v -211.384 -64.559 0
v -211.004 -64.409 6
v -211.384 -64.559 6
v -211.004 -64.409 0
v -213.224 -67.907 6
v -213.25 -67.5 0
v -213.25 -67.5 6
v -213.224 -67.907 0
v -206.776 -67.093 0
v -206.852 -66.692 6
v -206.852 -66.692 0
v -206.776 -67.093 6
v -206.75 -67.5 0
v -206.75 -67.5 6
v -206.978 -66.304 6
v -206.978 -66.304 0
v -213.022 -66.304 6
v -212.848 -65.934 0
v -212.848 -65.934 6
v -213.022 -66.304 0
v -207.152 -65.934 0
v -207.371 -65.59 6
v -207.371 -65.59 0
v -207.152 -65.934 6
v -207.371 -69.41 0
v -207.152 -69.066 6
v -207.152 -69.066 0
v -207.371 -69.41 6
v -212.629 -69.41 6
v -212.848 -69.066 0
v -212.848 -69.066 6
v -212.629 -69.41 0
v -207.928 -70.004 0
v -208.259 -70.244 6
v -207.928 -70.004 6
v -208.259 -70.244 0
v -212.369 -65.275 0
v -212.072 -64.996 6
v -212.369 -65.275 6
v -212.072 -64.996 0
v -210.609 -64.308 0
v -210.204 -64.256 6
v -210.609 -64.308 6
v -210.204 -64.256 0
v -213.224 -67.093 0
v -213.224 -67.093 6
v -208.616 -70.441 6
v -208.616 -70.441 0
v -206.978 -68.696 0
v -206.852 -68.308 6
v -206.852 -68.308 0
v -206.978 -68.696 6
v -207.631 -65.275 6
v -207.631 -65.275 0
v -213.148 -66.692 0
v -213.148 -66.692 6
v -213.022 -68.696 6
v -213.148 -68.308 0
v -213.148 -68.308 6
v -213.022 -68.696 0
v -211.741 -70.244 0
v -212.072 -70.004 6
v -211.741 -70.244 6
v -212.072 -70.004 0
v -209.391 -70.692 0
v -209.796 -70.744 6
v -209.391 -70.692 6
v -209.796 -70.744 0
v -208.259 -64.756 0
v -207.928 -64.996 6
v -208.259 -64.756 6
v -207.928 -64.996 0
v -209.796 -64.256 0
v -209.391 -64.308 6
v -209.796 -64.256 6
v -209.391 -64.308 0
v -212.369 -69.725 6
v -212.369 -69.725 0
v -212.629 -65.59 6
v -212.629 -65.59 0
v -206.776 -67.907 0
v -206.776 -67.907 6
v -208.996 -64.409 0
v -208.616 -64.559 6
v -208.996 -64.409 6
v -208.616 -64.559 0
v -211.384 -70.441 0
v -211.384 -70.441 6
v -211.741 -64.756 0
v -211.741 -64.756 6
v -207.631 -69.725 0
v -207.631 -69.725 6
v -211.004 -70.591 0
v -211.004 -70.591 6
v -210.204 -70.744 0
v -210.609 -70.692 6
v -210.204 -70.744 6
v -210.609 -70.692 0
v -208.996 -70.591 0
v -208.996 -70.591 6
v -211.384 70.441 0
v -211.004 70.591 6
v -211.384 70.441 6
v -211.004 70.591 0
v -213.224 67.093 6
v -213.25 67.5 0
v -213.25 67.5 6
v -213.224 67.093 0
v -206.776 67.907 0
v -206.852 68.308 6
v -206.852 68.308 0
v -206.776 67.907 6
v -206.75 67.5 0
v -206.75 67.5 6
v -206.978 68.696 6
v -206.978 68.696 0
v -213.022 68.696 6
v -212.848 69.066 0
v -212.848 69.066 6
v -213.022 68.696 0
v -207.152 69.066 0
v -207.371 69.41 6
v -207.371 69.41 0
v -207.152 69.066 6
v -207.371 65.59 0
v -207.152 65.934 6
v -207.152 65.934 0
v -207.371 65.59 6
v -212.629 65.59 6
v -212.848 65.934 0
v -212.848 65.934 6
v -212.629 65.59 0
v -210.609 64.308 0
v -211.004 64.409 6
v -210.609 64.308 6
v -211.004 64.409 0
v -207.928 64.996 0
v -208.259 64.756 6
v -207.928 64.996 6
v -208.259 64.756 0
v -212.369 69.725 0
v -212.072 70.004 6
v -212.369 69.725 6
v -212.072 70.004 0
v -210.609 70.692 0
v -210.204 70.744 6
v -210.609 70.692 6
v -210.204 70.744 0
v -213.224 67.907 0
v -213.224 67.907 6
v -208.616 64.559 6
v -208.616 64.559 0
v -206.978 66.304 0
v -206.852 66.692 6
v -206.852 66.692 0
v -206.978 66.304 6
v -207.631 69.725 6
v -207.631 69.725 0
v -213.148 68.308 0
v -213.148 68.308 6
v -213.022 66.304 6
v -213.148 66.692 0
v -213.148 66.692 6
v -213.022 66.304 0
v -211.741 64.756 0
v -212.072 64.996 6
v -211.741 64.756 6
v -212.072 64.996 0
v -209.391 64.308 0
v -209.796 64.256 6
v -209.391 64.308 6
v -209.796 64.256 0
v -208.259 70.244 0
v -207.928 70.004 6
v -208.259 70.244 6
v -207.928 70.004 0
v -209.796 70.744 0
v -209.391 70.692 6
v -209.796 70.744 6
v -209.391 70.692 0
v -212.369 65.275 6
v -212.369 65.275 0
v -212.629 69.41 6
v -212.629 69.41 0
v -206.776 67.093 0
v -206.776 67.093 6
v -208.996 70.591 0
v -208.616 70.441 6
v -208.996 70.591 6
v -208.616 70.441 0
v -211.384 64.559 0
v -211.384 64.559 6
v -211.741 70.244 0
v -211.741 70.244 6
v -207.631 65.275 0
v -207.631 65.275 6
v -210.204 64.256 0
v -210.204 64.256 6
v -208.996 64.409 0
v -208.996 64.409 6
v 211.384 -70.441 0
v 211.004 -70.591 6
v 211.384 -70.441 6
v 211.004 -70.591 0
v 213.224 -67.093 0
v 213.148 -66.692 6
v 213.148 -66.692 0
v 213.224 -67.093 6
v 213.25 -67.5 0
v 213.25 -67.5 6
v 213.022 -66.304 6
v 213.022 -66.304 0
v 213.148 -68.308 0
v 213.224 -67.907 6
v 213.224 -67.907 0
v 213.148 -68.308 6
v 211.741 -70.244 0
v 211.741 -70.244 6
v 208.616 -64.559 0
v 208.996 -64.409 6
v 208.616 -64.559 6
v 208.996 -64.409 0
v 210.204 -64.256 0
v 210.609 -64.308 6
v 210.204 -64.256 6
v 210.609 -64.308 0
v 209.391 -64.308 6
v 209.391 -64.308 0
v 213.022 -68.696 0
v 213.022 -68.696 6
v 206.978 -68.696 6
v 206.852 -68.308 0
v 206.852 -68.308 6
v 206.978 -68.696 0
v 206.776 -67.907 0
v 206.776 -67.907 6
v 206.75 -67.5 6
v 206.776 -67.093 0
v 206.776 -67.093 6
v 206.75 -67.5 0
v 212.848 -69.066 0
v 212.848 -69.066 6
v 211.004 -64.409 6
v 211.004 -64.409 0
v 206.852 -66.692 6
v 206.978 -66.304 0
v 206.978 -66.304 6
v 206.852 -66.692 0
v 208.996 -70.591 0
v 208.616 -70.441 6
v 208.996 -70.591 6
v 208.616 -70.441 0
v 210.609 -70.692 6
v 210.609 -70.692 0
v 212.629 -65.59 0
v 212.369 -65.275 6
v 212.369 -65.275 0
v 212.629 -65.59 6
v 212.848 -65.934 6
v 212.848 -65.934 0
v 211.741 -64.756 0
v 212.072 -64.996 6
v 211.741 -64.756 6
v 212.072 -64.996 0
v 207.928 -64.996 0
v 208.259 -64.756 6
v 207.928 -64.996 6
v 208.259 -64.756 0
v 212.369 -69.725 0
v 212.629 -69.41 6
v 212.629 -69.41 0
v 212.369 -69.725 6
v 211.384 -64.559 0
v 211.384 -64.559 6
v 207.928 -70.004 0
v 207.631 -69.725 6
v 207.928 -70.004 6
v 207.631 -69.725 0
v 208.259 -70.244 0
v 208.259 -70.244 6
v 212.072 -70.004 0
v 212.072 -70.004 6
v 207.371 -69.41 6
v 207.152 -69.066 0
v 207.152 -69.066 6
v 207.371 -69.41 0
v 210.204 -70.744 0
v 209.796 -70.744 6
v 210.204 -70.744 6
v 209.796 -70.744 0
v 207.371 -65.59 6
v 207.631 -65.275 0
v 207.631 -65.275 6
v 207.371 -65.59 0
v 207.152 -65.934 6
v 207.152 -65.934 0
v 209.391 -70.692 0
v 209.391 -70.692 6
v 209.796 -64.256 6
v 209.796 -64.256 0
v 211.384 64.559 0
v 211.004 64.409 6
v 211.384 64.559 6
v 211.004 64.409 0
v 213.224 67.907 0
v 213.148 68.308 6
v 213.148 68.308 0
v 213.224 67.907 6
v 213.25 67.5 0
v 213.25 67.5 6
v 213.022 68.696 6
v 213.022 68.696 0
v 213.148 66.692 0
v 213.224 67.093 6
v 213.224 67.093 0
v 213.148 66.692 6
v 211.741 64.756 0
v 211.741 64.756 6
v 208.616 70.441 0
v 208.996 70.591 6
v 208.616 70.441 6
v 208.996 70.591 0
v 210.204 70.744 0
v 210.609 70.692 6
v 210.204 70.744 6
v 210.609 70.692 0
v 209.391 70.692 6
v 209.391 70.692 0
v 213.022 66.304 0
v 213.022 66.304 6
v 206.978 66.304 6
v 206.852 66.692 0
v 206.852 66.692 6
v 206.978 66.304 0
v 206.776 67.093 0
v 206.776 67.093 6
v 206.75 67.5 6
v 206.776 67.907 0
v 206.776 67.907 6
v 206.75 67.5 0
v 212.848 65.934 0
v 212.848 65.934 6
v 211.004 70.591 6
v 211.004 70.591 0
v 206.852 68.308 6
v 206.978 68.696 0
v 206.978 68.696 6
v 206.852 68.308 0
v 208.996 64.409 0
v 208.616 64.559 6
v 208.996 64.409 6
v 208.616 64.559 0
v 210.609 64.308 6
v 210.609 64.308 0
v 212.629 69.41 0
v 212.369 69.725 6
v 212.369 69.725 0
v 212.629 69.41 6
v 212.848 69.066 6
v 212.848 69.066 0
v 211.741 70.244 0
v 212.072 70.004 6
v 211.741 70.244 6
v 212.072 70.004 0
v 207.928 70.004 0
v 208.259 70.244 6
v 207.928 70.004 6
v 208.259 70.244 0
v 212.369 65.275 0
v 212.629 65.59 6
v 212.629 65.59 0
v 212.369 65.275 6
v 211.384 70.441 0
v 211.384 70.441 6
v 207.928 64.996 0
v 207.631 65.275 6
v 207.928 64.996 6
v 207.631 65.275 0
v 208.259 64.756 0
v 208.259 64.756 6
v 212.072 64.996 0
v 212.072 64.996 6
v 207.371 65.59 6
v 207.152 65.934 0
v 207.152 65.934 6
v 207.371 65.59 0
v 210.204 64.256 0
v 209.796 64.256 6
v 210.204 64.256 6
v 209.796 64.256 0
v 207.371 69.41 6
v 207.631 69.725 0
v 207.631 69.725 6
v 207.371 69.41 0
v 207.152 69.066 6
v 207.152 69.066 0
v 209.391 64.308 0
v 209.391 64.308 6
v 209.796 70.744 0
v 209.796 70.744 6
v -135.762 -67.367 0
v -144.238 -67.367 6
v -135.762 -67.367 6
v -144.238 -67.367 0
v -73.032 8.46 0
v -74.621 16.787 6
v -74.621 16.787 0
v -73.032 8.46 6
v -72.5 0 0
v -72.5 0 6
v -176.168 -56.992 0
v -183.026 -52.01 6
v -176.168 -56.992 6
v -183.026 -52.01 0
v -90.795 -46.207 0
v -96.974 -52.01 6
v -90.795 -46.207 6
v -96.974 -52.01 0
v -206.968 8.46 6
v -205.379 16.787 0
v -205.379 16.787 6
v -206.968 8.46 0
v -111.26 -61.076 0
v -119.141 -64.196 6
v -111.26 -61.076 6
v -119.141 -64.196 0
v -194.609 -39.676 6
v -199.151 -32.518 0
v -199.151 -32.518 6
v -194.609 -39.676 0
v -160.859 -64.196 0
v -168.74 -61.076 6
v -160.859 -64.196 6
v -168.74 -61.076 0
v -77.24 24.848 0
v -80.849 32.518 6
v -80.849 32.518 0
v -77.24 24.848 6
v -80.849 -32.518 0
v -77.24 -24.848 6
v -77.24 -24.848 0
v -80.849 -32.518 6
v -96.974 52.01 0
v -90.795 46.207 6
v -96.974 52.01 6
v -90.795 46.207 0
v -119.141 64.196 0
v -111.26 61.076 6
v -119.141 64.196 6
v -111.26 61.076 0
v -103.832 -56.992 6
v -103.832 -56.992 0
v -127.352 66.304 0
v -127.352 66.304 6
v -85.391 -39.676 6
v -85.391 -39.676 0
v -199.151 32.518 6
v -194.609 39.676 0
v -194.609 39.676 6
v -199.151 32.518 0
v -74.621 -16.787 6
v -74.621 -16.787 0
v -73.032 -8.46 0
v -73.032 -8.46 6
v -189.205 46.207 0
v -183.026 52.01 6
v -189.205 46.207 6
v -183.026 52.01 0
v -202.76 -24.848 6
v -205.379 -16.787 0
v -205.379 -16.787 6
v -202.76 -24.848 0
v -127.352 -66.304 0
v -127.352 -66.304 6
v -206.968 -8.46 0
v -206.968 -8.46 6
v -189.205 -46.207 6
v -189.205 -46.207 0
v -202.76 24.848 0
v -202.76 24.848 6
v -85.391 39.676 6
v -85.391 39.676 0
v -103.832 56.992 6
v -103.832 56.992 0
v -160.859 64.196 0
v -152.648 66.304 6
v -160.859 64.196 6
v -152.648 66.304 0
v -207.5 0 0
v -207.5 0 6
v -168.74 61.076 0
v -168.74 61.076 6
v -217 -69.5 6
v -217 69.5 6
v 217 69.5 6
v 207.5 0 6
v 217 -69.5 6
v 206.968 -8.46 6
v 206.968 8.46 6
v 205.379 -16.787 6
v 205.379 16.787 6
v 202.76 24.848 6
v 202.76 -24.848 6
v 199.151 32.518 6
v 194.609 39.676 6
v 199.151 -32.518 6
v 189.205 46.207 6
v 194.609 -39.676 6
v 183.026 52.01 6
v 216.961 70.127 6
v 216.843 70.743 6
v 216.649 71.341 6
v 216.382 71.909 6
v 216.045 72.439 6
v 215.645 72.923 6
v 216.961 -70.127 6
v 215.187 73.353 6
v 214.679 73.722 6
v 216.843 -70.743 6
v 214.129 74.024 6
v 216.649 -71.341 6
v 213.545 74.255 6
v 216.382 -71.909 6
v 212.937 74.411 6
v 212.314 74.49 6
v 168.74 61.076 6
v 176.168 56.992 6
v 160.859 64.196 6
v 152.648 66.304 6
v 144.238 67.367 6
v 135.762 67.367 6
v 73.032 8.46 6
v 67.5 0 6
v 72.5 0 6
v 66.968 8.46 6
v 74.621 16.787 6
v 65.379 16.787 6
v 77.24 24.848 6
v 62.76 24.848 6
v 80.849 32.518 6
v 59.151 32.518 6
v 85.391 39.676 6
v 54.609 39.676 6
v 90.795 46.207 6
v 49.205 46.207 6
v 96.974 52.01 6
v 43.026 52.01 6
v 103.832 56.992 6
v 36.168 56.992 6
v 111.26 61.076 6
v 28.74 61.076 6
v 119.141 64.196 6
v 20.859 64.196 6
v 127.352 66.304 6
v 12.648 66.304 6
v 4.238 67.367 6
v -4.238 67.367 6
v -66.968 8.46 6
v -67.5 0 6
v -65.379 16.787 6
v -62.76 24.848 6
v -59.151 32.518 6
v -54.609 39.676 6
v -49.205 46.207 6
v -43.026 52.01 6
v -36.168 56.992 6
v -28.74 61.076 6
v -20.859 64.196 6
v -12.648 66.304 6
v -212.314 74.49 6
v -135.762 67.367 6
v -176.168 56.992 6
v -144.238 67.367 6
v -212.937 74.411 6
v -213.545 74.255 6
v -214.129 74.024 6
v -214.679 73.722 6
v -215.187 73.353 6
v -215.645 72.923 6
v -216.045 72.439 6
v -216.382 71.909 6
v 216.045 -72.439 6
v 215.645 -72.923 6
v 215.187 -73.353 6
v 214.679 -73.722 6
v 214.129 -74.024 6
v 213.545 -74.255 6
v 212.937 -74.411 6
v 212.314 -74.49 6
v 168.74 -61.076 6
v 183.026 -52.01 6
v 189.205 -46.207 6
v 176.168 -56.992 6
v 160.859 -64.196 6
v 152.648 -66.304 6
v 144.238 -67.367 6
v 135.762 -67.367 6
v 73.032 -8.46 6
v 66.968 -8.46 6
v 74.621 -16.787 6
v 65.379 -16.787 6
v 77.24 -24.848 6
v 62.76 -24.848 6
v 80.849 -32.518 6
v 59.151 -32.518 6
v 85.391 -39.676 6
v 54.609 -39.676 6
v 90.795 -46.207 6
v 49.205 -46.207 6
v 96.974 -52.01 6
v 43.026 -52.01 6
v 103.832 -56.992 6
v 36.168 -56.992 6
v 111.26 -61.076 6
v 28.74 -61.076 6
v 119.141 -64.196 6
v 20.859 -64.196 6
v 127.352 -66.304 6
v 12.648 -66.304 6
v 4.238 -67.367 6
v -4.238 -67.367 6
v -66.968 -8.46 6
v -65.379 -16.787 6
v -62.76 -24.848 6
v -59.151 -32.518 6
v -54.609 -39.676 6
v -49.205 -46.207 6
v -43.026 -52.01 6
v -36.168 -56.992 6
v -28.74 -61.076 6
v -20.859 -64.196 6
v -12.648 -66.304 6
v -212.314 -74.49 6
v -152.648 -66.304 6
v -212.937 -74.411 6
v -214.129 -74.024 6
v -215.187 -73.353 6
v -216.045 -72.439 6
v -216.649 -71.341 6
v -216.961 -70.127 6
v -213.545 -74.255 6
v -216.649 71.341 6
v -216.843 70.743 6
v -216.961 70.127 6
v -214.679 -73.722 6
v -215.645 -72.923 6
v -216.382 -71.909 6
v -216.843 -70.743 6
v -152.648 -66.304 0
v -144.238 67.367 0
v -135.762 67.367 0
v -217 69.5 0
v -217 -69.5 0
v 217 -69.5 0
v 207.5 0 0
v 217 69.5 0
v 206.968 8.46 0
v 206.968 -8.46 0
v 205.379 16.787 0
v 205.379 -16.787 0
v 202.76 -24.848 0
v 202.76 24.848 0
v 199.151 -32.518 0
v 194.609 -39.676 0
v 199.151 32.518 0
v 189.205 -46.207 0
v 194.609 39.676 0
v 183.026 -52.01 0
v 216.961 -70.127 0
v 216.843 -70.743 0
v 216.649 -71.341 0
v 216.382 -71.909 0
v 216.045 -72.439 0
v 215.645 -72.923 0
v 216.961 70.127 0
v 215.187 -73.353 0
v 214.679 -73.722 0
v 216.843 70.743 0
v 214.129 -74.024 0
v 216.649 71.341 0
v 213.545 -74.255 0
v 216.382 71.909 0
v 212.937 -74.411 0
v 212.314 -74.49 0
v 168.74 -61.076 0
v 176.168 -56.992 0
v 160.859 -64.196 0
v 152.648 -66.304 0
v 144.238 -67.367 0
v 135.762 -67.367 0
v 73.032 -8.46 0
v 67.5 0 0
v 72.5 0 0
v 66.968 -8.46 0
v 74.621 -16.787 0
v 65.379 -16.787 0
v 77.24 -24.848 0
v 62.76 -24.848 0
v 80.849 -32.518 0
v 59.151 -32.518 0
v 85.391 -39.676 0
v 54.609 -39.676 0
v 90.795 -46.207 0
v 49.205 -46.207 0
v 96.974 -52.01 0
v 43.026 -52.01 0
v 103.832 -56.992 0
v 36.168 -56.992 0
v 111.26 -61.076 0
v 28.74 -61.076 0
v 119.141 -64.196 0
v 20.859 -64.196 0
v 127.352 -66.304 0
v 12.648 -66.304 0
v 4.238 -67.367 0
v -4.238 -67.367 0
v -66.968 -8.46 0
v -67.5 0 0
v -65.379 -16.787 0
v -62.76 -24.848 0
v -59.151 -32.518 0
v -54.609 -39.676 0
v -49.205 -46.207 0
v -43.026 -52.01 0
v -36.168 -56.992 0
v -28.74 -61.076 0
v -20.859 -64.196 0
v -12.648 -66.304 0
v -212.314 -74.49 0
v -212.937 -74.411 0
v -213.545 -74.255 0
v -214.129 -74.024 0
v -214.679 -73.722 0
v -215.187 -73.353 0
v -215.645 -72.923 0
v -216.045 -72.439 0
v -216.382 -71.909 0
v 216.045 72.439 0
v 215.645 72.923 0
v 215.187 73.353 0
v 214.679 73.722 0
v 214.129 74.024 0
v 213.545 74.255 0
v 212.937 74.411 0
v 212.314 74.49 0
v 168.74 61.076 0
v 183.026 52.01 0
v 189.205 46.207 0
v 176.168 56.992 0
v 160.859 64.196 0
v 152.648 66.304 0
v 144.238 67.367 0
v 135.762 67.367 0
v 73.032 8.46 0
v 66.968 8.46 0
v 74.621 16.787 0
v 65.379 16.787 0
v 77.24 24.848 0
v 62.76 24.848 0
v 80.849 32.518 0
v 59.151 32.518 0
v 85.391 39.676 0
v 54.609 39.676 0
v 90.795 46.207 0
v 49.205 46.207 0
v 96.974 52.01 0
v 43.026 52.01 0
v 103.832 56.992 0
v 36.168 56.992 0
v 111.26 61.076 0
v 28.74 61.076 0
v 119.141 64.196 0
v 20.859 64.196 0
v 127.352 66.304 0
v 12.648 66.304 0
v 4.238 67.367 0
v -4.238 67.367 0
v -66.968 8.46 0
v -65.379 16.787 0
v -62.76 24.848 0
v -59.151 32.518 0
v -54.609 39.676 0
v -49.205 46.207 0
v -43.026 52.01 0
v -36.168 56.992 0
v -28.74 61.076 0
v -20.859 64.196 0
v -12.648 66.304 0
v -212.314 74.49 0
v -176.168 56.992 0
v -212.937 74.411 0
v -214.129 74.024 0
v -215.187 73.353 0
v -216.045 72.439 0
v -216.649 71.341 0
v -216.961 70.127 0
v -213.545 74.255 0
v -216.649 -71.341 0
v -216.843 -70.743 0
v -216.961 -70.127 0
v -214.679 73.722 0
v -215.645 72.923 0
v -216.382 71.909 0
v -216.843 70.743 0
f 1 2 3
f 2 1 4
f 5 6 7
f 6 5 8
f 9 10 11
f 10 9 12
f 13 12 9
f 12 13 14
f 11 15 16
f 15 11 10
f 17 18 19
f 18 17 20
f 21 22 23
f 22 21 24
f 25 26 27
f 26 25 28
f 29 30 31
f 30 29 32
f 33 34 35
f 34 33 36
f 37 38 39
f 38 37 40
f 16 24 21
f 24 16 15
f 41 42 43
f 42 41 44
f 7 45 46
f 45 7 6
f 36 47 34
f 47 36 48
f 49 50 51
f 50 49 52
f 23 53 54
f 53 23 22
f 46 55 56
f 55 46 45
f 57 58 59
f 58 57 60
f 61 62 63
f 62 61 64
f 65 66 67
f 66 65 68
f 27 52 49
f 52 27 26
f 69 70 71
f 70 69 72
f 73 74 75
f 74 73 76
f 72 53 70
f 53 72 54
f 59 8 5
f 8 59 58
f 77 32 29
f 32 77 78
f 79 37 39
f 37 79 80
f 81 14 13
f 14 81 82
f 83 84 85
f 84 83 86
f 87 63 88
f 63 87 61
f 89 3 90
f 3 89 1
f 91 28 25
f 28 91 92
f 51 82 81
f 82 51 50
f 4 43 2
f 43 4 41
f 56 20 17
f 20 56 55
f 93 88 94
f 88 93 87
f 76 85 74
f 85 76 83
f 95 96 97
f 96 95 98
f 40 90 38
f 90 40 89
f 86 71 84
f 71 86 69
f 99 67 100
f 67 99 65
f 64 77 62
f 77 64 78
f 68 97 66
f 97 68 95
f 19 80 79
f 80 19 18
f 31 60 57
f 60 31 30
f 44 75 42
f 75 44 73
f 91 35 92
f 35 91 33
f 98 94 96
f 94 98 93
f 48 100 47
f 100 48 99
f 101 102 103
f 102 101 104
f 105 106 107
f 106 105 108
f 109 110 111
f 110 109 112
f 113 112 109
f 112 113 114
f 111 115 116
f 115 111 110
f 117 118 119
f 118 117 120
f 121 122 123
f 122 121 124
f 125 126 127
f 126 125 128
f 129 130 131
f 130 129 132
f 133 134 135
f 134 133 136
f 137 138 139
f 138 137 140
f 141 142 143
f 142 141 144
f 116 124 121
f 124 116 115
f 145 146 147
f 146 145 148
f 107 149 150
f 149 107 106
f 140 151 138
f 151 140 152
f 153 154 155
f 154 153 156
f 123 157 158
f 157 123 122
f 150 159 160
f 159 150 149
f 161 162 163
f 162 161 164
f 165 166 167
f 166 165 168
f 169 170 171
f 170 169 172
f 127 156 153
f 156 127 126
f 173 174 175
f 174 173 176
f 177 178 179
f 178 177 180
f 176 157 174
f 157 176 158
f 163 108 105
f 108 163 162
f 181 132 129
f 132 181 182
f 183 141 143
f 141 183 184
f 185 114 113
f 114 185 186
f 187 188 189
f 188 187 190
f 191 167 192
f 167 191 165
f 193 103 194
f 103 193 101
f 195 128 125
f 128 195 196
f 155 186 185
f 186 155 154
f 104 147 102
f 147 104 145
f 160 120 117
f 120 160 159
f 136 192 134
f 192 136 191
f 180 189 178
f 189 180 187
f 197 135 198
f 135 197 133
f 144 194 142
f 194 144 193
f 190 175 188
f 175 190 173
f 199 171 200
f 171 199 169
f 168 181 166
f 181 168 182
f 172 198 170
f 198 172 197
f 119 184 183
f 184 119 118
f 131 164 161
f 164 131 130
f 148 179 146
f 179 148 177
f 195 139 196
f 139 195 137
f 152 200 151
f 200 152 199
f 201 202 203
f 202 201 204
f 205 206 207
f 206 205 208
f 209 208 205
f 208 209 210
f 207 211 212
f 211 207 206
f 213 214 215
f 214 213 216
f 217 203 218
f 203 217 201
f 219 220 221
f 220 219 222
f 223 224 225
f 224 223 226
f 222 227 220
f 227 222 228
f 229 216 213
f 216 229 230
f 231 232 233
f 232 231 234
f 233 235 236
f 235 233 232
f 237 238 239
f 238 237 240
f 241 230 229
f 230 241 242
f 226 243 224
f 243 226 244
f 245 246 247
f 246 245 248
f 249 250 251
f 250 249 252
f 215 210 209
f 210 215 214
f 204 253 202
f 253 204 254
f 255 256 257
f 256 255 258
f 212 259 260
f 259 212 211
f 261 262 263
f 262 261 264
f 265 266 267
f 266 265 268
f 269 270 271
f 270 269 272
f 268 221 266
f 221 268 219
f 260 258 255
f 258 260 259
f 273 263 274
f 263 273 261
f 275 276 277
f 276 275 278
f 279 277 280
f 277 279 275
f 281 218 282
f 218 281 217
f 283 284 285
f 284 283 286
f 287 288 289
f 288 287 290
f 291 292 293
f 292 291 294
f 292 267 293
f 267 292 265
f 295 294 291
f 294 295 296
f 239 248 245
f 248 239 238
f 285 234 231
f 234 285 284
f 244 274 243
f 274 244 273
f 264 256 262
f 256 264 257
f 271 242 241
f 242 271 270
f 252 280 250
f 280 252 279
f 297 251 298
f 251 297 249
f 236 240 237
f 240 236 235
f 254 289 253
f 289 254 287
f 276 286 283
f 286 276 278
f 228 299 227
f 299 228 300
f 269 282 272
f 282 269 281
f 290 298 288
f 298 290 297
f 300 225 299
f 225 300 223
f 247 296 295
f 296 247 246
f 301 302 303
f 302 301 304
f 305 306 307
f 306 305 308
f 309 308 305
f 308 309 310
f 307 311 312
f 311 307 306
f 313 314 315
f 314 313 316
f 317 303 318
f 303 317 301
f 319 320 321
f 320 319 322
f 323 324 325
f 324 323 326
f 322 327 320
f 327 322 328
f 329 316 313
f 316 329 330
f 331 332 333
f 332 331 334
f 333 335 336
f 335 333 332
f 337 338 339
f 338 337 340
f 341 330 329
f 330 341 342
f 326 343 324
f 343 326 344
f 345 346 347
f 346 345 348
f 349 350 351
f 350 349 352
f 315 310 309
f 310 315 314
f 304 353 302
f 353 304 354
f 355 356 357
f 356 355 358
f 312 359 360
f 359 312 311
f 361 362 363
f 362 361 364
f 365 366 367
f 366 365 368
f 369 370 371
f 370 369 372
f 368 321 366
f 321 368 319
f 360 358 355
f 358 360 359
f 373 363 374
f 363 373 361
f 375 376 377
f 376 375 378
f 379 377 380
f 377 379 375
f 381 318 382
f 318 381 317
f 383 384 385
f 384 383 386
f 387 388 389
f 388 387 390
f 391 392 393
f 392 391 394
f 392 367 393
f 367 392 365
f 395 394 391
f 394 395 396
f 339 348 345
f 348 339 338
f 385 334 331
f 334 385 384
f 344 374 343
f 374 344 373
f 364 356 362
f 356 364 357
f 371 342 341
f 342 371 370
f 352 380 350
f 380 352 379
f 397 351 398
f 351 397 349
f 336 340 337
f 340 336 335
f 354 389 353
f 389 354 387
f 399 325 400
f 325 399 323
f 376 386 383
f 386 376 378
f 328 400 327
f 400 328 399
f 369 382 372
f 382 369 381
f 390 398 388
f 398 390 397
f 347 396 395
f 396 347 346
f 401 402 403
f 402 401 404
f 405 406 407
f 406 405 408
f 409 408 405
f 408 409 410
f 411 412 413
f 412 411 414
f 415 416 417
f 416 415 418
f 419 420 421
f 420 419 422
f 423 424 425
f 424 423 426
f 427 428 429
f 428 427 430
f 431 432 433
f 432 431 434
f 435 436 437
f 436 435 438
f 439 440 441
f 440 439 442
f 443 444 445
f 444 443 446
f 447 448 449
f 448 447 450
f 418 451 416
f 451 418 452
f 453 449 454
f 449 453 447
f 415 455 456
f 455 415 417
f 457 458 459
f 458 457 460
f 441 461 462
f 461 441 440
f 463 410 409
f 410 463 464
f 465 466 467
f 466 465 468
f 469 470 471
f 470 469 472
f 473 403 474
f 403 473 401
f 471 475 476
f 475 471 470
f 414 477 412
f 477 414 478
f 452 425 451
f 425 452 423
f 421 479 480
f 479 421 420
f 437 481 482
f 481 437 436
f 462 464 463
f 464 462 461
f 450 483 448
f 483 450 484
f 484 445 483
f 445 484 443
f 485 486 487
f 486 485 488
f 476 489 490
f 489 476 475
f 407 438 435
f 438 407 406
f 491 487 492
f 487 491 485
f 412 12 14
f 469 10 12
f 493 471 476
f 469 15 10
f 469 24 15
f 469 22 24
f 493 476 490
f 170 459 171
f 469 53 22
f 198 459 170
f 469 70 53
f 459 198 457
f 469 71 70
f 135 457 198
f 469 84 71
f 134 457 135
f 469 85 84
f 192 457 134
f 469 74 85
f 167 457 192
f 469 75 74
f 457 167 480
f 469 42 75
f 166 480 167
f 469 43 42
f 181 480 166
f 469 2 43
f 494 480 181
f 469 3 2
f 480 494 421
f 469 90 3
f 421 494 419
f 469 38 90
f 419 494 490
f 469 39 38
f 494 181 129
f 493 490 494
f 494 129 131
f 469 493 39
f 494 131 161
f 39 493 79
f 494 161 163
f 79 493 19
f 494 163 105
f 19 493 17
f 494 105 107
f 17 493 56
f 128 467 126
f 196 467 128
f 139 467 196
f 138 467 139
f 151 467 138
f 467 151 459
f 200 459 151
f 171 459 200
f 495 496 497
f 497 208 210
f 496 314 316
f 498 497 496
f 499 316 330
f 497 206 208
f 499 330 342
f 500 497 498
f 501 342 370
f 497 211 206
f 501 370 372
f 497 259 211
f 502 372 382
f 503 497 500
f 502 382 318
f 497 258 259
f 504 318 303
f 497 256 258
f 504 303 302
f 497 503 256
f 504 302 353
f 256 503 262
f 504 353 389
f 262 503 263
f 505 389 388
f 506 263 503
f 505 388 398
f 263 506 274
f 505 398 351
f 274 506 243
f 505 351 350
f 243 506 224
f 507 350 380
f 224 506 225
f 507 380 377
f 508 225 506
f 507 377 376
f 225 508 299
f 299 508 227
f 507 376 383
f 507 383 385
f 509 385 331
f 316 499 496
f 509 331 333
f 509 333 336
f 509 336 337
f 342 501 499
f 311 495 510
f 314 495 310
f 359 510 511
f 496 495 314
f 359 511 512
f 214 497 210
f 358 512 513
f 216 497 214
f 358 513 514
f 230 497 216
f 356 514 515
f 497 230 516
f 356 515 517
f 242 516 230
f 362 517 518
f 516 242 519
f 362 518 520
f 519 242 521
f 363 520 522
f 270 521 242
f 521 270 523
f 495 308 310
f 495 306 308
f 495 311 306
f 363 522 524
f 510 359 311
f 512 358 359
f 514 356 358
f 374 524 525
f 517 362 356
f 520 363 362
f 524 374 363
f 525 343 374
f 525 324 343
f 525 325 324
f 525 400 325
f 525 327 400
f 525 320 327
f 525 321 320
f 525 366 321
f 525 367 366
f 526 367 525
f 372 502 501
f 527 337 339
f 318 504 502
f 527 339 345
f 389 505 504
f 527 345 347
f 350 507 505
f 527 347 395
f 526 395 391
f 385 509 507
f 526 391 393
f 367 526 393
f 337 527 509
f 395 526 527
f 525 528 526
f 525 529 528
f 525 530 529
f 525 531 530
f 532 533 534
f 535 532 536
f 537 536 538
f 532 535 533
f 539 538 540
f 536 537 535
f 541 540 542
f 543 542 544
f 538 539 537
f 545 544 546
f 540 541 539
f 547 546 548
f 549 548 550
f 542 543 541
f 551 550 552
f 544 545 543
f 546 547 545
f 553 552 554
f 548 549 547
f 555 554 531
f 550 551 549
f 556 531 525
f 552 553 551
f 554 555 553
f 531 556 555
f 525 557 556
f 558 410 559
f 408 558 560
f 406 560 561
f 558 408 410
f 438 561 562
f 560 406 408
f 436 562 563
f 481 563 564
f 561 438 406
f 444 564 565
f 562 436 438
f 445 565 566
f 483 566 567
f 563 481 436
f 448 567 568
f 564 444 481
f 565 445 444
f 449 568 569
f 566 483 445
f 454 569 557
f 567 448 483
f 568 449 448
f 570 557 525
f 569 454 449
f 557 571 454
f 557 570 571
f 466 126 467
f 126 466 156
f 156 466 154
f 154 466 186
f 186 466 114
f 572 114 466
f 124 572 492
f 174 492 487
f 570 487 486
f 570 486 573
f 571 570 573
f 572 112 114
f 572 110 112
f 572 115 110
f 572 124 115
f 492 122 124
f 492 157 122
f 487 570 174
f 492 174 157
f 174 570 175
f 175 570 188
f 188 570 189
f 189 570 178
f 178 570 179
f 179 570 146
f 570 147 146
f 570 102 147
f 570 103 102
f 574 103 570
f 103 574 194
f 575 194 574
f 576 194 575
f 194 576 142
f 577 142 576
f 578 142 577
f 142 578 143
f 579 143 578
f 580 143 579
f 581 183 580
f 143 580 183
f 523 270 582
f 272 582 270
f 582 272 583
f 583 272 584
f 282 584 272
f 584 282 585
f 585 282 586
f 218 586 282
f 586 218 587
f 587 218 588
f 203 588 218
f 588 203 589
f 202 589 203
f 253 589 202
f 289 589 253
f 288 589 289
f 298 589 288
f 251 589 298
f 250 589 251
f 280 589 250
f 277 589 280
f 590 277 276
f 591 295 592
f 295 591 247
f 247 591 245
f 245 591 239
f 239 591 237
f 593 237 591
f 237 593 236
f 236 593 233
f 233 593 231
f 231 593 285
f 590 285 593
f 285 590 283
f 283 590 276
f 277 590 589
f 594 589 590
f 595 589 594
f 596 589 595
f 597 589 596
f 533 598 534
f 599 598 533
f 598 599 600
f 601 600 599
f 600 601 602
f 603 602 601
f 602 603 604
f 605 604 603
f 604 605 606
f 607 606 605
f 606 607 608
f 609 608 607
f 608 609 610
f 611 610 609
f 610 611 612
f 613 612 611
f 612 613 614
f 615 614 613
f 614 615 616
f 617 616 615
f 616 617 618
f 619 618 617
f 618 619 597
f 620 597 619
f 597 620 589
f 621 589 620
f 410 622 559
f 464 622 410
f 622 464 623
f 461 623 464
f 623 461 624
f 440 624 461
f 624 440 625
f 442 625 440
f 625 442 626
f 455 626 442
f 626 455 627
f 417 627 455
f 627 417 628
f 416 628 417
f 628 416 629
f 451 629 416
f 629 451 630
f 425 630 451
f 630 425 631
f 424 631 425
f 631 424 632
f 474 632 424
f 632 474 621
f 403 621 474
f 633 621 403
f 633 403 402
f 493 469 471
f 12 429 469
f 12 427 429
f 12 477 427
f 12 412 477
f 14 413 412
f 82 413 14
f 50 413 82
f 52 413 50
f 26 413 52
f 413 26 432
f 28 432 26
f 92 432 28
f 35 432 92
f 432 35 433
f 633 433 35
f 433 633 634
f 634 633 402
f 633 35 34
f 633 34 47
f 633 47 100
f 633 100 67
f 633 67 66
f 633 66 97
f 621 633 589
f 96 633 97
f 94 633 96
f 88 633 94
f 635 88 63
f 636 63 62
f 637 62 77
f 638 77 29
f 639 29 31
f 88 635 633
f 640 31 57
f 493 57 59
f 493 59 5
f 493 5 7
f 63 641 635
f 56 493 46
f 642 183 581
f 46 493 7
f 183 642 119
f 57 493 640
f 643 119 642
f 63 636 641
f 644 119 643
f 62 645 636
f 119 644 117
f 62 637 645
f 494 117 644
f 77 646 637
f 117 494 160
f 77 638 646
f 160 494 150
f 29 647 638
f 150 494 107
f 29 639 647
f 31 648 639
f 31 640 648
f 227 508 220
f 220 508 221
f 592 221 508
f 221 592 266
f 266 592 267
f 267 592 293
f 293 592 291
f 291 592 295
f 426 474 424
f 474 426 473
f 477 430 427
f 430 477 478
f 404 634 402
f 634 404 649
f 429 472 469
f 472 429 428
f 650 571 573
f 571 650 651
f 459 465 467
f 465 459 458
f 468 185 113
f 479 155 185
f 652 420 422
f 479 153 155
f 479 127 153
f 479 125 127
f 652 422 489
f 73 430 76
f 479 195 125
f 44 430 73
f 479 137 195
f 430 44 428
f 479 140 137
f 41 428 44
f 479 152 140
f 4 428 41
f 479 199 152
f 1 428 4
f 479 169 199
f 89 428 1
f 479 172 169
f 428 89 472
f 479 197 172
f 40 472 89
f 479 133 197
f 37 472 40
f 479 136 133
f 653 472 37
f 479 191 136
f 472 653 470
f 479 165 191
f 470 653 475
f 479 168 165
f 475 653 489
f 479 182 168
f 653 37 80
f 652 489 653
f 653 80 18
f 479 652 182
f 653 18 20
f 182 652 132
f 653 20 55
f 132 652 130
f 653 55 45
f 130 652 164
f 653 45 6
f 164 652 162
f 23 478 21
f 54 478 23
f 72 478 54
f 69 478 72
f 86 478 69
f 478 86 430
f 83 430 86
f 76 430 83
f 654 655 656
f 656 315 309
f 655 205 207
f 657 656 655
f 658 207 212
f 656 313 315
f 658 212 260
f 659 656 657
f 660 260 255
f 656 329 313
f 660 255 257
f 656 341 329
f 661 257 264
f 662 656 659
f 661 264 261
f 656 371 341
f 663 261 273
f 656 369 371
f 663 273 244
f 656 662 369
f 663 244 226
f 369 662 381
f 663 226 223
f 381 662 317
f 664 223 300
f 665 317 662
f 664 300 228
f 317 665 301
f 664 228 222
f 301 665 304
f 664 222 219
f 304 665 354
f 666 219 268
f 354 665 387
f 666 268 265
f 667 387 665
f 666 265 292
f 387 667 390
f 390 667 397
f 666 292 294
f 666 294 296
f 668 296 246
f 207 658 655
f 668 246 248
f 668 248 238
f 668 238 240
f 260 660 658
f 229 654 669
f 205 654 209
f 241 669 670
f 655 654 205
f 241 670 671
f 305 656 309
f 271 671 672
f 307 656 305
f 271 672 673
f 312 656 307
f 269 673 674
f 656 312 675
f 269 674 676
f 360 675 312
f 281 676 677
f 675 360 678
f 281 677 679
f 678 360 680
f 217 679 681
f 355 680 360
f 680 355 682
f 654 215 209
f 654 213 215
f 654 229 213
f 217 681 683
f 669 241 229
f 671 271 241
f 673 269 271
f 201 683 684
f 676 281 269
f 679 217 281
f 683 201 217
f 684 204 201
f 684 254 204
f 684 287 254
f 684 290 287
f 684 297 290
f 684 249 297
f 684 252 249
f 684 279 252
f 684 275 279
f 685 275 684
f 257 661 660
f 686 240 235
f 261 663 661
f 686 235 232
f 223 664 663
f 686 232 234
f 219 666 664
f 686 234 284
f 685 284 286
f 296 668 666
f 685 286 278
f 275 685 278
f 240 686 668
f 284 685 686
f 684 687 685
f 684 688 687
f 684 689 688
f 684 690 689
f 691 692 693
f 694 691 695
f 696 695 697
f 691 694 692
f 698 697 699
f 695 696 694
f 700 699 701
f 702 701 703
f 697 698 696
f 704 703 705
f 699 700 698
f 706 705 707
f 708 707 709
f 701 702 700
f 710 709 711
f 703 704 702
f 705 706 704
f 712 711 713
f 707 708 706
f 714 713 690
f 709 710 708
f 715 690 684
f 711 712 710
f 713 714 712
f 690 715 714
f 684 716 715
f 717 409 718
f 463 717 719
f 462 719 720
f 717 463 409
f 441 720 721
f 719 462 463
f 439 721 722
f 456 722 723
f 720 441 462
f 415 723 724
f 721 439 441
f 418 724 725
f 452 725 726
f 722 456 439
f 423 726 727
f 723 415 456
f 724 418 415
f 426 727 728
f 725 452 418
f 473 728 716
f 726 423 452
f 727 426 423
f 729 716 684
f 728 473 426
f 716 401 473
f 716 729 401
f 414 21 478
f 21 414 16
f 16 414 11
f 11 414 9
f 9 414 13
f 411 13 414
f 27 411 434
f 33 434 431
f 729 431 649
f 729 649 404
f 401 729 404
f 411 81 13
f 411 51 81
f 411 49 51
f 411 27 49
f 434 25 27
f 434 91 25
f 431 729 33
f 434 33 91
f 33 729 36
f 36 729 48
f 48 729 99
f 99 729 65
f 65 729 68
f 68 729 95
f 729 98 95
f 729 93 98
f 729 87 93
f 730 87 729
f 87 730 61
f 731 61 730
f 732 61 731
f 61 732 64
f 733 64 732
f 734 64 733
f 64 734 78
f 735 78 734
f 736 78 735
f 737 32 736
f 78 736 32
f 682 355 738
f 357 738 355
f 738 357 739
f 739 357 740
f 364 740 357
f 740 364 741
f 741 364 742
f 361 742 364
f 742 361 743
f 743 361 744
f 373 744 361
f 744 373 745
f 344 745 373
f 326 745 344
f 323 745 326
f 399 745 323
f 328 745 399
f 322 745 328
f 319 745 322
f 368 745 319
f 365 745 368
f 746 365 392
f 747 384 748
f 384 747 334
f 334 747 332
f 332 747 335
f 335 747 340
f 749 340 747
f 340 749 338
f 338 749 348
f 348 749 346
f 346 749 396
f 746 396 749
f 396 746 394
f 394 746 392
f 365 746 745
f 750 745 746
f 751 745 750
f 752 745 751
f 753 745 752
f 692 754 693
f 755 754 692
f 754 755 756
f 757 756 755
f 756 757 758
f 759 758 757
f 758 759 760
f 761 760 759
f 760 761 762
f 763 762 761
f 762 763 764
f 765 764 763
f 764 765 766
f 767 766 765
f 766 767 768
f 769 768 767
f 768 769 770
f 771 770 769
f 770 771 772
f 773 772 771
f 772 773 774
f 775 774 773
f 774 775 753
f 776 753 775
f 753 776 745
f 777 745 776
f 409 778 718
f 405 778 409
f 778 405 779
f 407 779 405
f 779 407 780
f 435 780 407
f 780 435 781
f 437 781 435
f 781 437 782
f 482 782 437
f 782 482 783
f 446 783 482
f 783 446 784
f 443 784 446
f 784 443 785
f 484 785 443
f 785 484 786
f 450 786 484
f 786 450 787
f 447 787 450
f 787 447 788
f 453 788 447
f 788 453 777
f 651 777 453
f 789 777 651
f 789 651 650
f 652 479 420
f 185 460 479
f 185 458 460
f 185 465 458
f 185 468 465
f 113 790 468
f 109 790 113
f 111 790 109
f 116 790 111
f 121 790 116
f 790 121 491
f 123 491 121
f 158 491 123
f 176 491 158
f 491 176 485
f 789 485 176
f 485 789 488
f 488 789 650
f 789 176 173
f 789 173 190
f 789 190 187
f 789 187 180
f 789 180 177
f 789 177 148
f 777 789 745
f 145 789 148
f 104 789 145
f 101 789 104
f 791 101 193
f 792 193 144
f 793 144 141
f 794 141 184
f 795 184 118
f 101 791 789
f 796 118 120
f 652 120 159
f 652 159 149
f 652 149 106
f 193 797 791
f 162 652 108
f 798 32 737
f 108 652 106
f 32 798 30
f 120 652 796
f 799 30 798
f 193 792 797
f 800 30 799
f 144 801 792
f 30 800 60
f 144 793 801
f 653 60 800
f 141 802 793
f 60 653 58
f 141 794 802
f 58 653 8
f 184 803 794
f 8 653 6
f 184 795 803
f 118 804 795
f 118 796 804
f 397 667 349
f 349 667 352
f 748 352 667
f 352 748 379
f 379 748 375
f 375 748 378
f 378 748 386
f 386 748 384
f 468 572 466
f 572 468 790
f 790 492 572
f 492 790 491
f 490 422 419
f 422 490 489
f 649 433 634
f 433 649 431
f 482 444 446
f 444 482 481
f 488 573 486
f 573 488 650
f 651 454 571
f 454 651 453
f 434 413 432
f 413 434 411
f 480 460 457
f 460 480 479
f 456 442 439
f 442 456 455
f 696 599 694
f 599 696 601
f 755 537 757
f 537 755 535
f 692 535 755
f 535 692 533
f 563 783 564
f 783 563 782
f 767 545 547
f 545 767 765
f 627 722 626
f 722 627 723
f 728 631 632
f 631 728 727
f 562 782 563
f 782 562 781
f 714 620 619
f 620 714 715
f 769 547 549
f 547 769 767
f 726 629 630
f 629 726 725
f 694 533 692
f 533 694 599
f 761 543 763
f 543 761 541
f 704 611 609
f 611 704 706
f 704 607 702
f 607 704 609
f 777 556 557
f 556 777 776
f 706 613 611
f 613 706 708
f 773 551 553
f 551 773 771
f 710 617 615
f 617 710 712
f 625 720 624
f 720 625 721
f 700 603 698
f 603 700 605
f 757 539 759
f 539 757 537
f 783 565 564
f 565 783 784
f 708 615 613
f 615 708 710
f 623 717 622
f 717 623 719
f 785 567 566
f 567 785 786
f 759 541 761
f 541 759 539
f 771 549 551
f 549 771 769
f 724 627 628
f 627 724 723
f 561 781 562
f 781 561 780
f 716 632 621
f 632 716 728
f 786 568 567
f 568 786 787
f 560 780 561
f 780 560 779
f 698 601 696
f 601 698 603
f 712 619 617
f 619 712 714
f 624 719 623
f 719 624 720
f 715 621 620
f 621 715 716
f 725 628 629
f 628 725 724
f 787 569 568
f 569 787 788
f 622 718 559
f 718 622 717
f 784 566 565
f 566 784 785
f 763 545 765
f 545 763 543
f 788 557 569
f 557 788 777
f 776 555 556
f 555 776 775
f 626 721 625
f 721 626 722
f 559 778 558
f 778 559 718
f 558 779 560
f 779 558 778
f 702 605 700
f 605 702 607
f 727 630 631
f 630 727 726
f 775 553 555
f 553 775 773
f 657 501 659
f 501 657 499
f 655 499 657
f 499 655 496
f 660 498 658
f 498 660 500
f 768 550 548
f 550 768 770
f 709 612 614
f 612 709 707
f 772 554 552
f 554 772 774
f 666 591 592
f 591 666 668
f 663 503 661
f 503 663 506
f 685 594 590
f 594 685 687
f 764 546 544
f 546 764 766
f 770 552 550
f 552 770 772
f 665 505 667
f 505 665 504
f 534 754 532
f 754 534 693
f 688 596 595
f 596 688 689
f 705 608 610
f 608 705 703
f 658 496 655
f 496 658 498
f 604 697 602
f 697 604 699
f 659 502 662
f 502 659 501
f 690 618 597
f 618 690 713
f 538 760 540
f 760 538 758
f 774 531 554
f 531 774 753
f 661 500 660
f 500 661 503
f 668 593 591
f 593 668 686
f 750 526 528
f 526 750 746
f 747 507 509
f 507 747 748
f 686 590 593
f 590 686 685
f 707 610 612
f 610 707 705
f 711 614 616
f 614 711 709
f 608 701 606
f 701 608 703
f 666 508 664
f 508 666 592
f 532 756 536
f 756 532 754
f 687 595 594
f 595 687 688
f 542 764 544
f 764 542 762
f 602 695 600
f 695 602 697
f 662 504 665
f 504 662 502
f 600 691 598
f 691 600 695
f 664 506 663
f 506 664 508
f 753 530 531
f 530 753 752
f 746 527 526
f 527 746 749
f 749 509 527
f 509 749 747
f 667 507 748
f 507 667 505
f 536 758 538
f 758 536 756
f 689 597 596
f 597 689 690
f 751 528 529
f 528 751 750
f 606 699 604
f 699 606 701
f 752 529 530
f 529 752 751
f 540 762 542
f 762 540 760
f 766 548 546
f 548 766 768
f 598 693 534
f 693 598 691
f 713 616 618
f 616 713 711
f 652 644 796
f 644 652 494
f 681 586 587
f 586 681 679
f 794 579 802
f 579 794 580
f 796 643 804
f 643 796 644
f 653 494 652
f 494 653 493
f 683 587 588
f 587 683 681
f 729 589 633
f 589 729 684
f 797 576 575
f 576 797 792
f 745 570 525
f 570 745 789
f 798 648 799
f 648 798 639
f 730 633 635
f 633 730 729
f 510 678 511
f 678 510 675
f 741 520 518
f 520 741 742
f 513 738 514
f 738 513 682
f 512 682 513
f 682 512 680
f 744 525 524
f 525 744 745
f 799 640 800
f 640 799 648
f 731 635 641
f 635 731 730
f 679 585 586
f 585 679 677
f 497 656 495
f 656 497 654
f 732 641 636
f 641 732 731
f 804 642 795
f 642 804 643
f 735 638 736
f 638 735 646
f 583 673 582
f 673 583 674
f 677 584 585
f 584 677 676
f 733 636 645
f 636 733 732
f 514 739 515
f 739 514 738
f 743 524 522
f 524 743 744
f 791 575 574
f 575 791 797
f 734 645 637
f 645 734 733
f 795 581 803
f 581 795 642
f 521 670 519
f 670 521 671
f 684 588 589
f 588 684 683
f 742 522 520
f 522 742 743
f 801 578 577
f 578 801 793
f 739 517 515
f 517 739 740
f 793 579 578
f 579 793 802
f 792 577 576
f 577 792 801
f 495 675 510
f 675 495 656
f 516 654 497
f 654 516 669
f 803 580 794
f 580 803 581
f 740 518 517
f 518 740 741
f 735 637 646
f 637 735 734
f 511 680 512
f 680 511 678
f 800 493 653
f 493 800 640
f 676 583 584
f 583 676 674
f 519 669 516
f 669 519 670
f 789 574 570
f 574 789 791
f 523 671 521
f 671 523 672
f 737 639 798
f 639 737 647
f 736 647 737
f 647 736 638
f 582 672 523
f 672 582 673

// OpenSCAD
$fn = 50;

difference() {
	union() {
		hull() {
			translate(v = [-212.0, 69.5, 0]) {
				cylinder(h = 6, r = 5);
			}
			translate(v = [212.0, 69.5, 0]) {
				cylinder(h = 6, r = 5);
			}
			translate(v = [-212.0, -69.5, 0]) {
				cylinder(h = 6, r = 5);
			}
			translate(v = [212.0, -69.5, 0]) {
				cylinder(h = 6, r = 5);
			}
		}
	}
	union() {
		translate(v = [-210.0, -67.5, -100.0]) {
			cylinder(h = 200, r = 3.25);
		}
		translate(v = [-210.0, 67.5, -100.0]) {
			cylinder(h = 200, r = 3.25);
		}
		translate(v = [210.0, -67.5, -100.0]) {
			cylinder(h = 200, r = 3.25);
		}
		translate(v = [210.0, 67.5, -100.0]) {
			cylinder(h = 200, r = 3.25);
		}
		translate(v = [-210.0, -67.5, -100.0]) {
			cylinder(h = 200, r = 1.8);
		}
		translate(v = [-210.0, 67.5, -100.0]) {
			cylinder(h = 200, r = 1.8);
		}
		translate(v = [210.0, -67.5, -100.0]) {
			cylinder(h = 200, r = 1.8);
		}
		translate(v = [210.0, 67.5, -100.0]) {
			cylinder(h = 200, r = 1.8);
		}
		translate(v = [-140.0, 0, 0.0]) {
			cylinder(h = 6, r = 67.5);
		}
		cylinder(h = 6, r = 67.5);
		translate(v = [140.0, 0, 0.0]) {
			cylinder(h = 6, r = 67.5);
		}
	}
}
